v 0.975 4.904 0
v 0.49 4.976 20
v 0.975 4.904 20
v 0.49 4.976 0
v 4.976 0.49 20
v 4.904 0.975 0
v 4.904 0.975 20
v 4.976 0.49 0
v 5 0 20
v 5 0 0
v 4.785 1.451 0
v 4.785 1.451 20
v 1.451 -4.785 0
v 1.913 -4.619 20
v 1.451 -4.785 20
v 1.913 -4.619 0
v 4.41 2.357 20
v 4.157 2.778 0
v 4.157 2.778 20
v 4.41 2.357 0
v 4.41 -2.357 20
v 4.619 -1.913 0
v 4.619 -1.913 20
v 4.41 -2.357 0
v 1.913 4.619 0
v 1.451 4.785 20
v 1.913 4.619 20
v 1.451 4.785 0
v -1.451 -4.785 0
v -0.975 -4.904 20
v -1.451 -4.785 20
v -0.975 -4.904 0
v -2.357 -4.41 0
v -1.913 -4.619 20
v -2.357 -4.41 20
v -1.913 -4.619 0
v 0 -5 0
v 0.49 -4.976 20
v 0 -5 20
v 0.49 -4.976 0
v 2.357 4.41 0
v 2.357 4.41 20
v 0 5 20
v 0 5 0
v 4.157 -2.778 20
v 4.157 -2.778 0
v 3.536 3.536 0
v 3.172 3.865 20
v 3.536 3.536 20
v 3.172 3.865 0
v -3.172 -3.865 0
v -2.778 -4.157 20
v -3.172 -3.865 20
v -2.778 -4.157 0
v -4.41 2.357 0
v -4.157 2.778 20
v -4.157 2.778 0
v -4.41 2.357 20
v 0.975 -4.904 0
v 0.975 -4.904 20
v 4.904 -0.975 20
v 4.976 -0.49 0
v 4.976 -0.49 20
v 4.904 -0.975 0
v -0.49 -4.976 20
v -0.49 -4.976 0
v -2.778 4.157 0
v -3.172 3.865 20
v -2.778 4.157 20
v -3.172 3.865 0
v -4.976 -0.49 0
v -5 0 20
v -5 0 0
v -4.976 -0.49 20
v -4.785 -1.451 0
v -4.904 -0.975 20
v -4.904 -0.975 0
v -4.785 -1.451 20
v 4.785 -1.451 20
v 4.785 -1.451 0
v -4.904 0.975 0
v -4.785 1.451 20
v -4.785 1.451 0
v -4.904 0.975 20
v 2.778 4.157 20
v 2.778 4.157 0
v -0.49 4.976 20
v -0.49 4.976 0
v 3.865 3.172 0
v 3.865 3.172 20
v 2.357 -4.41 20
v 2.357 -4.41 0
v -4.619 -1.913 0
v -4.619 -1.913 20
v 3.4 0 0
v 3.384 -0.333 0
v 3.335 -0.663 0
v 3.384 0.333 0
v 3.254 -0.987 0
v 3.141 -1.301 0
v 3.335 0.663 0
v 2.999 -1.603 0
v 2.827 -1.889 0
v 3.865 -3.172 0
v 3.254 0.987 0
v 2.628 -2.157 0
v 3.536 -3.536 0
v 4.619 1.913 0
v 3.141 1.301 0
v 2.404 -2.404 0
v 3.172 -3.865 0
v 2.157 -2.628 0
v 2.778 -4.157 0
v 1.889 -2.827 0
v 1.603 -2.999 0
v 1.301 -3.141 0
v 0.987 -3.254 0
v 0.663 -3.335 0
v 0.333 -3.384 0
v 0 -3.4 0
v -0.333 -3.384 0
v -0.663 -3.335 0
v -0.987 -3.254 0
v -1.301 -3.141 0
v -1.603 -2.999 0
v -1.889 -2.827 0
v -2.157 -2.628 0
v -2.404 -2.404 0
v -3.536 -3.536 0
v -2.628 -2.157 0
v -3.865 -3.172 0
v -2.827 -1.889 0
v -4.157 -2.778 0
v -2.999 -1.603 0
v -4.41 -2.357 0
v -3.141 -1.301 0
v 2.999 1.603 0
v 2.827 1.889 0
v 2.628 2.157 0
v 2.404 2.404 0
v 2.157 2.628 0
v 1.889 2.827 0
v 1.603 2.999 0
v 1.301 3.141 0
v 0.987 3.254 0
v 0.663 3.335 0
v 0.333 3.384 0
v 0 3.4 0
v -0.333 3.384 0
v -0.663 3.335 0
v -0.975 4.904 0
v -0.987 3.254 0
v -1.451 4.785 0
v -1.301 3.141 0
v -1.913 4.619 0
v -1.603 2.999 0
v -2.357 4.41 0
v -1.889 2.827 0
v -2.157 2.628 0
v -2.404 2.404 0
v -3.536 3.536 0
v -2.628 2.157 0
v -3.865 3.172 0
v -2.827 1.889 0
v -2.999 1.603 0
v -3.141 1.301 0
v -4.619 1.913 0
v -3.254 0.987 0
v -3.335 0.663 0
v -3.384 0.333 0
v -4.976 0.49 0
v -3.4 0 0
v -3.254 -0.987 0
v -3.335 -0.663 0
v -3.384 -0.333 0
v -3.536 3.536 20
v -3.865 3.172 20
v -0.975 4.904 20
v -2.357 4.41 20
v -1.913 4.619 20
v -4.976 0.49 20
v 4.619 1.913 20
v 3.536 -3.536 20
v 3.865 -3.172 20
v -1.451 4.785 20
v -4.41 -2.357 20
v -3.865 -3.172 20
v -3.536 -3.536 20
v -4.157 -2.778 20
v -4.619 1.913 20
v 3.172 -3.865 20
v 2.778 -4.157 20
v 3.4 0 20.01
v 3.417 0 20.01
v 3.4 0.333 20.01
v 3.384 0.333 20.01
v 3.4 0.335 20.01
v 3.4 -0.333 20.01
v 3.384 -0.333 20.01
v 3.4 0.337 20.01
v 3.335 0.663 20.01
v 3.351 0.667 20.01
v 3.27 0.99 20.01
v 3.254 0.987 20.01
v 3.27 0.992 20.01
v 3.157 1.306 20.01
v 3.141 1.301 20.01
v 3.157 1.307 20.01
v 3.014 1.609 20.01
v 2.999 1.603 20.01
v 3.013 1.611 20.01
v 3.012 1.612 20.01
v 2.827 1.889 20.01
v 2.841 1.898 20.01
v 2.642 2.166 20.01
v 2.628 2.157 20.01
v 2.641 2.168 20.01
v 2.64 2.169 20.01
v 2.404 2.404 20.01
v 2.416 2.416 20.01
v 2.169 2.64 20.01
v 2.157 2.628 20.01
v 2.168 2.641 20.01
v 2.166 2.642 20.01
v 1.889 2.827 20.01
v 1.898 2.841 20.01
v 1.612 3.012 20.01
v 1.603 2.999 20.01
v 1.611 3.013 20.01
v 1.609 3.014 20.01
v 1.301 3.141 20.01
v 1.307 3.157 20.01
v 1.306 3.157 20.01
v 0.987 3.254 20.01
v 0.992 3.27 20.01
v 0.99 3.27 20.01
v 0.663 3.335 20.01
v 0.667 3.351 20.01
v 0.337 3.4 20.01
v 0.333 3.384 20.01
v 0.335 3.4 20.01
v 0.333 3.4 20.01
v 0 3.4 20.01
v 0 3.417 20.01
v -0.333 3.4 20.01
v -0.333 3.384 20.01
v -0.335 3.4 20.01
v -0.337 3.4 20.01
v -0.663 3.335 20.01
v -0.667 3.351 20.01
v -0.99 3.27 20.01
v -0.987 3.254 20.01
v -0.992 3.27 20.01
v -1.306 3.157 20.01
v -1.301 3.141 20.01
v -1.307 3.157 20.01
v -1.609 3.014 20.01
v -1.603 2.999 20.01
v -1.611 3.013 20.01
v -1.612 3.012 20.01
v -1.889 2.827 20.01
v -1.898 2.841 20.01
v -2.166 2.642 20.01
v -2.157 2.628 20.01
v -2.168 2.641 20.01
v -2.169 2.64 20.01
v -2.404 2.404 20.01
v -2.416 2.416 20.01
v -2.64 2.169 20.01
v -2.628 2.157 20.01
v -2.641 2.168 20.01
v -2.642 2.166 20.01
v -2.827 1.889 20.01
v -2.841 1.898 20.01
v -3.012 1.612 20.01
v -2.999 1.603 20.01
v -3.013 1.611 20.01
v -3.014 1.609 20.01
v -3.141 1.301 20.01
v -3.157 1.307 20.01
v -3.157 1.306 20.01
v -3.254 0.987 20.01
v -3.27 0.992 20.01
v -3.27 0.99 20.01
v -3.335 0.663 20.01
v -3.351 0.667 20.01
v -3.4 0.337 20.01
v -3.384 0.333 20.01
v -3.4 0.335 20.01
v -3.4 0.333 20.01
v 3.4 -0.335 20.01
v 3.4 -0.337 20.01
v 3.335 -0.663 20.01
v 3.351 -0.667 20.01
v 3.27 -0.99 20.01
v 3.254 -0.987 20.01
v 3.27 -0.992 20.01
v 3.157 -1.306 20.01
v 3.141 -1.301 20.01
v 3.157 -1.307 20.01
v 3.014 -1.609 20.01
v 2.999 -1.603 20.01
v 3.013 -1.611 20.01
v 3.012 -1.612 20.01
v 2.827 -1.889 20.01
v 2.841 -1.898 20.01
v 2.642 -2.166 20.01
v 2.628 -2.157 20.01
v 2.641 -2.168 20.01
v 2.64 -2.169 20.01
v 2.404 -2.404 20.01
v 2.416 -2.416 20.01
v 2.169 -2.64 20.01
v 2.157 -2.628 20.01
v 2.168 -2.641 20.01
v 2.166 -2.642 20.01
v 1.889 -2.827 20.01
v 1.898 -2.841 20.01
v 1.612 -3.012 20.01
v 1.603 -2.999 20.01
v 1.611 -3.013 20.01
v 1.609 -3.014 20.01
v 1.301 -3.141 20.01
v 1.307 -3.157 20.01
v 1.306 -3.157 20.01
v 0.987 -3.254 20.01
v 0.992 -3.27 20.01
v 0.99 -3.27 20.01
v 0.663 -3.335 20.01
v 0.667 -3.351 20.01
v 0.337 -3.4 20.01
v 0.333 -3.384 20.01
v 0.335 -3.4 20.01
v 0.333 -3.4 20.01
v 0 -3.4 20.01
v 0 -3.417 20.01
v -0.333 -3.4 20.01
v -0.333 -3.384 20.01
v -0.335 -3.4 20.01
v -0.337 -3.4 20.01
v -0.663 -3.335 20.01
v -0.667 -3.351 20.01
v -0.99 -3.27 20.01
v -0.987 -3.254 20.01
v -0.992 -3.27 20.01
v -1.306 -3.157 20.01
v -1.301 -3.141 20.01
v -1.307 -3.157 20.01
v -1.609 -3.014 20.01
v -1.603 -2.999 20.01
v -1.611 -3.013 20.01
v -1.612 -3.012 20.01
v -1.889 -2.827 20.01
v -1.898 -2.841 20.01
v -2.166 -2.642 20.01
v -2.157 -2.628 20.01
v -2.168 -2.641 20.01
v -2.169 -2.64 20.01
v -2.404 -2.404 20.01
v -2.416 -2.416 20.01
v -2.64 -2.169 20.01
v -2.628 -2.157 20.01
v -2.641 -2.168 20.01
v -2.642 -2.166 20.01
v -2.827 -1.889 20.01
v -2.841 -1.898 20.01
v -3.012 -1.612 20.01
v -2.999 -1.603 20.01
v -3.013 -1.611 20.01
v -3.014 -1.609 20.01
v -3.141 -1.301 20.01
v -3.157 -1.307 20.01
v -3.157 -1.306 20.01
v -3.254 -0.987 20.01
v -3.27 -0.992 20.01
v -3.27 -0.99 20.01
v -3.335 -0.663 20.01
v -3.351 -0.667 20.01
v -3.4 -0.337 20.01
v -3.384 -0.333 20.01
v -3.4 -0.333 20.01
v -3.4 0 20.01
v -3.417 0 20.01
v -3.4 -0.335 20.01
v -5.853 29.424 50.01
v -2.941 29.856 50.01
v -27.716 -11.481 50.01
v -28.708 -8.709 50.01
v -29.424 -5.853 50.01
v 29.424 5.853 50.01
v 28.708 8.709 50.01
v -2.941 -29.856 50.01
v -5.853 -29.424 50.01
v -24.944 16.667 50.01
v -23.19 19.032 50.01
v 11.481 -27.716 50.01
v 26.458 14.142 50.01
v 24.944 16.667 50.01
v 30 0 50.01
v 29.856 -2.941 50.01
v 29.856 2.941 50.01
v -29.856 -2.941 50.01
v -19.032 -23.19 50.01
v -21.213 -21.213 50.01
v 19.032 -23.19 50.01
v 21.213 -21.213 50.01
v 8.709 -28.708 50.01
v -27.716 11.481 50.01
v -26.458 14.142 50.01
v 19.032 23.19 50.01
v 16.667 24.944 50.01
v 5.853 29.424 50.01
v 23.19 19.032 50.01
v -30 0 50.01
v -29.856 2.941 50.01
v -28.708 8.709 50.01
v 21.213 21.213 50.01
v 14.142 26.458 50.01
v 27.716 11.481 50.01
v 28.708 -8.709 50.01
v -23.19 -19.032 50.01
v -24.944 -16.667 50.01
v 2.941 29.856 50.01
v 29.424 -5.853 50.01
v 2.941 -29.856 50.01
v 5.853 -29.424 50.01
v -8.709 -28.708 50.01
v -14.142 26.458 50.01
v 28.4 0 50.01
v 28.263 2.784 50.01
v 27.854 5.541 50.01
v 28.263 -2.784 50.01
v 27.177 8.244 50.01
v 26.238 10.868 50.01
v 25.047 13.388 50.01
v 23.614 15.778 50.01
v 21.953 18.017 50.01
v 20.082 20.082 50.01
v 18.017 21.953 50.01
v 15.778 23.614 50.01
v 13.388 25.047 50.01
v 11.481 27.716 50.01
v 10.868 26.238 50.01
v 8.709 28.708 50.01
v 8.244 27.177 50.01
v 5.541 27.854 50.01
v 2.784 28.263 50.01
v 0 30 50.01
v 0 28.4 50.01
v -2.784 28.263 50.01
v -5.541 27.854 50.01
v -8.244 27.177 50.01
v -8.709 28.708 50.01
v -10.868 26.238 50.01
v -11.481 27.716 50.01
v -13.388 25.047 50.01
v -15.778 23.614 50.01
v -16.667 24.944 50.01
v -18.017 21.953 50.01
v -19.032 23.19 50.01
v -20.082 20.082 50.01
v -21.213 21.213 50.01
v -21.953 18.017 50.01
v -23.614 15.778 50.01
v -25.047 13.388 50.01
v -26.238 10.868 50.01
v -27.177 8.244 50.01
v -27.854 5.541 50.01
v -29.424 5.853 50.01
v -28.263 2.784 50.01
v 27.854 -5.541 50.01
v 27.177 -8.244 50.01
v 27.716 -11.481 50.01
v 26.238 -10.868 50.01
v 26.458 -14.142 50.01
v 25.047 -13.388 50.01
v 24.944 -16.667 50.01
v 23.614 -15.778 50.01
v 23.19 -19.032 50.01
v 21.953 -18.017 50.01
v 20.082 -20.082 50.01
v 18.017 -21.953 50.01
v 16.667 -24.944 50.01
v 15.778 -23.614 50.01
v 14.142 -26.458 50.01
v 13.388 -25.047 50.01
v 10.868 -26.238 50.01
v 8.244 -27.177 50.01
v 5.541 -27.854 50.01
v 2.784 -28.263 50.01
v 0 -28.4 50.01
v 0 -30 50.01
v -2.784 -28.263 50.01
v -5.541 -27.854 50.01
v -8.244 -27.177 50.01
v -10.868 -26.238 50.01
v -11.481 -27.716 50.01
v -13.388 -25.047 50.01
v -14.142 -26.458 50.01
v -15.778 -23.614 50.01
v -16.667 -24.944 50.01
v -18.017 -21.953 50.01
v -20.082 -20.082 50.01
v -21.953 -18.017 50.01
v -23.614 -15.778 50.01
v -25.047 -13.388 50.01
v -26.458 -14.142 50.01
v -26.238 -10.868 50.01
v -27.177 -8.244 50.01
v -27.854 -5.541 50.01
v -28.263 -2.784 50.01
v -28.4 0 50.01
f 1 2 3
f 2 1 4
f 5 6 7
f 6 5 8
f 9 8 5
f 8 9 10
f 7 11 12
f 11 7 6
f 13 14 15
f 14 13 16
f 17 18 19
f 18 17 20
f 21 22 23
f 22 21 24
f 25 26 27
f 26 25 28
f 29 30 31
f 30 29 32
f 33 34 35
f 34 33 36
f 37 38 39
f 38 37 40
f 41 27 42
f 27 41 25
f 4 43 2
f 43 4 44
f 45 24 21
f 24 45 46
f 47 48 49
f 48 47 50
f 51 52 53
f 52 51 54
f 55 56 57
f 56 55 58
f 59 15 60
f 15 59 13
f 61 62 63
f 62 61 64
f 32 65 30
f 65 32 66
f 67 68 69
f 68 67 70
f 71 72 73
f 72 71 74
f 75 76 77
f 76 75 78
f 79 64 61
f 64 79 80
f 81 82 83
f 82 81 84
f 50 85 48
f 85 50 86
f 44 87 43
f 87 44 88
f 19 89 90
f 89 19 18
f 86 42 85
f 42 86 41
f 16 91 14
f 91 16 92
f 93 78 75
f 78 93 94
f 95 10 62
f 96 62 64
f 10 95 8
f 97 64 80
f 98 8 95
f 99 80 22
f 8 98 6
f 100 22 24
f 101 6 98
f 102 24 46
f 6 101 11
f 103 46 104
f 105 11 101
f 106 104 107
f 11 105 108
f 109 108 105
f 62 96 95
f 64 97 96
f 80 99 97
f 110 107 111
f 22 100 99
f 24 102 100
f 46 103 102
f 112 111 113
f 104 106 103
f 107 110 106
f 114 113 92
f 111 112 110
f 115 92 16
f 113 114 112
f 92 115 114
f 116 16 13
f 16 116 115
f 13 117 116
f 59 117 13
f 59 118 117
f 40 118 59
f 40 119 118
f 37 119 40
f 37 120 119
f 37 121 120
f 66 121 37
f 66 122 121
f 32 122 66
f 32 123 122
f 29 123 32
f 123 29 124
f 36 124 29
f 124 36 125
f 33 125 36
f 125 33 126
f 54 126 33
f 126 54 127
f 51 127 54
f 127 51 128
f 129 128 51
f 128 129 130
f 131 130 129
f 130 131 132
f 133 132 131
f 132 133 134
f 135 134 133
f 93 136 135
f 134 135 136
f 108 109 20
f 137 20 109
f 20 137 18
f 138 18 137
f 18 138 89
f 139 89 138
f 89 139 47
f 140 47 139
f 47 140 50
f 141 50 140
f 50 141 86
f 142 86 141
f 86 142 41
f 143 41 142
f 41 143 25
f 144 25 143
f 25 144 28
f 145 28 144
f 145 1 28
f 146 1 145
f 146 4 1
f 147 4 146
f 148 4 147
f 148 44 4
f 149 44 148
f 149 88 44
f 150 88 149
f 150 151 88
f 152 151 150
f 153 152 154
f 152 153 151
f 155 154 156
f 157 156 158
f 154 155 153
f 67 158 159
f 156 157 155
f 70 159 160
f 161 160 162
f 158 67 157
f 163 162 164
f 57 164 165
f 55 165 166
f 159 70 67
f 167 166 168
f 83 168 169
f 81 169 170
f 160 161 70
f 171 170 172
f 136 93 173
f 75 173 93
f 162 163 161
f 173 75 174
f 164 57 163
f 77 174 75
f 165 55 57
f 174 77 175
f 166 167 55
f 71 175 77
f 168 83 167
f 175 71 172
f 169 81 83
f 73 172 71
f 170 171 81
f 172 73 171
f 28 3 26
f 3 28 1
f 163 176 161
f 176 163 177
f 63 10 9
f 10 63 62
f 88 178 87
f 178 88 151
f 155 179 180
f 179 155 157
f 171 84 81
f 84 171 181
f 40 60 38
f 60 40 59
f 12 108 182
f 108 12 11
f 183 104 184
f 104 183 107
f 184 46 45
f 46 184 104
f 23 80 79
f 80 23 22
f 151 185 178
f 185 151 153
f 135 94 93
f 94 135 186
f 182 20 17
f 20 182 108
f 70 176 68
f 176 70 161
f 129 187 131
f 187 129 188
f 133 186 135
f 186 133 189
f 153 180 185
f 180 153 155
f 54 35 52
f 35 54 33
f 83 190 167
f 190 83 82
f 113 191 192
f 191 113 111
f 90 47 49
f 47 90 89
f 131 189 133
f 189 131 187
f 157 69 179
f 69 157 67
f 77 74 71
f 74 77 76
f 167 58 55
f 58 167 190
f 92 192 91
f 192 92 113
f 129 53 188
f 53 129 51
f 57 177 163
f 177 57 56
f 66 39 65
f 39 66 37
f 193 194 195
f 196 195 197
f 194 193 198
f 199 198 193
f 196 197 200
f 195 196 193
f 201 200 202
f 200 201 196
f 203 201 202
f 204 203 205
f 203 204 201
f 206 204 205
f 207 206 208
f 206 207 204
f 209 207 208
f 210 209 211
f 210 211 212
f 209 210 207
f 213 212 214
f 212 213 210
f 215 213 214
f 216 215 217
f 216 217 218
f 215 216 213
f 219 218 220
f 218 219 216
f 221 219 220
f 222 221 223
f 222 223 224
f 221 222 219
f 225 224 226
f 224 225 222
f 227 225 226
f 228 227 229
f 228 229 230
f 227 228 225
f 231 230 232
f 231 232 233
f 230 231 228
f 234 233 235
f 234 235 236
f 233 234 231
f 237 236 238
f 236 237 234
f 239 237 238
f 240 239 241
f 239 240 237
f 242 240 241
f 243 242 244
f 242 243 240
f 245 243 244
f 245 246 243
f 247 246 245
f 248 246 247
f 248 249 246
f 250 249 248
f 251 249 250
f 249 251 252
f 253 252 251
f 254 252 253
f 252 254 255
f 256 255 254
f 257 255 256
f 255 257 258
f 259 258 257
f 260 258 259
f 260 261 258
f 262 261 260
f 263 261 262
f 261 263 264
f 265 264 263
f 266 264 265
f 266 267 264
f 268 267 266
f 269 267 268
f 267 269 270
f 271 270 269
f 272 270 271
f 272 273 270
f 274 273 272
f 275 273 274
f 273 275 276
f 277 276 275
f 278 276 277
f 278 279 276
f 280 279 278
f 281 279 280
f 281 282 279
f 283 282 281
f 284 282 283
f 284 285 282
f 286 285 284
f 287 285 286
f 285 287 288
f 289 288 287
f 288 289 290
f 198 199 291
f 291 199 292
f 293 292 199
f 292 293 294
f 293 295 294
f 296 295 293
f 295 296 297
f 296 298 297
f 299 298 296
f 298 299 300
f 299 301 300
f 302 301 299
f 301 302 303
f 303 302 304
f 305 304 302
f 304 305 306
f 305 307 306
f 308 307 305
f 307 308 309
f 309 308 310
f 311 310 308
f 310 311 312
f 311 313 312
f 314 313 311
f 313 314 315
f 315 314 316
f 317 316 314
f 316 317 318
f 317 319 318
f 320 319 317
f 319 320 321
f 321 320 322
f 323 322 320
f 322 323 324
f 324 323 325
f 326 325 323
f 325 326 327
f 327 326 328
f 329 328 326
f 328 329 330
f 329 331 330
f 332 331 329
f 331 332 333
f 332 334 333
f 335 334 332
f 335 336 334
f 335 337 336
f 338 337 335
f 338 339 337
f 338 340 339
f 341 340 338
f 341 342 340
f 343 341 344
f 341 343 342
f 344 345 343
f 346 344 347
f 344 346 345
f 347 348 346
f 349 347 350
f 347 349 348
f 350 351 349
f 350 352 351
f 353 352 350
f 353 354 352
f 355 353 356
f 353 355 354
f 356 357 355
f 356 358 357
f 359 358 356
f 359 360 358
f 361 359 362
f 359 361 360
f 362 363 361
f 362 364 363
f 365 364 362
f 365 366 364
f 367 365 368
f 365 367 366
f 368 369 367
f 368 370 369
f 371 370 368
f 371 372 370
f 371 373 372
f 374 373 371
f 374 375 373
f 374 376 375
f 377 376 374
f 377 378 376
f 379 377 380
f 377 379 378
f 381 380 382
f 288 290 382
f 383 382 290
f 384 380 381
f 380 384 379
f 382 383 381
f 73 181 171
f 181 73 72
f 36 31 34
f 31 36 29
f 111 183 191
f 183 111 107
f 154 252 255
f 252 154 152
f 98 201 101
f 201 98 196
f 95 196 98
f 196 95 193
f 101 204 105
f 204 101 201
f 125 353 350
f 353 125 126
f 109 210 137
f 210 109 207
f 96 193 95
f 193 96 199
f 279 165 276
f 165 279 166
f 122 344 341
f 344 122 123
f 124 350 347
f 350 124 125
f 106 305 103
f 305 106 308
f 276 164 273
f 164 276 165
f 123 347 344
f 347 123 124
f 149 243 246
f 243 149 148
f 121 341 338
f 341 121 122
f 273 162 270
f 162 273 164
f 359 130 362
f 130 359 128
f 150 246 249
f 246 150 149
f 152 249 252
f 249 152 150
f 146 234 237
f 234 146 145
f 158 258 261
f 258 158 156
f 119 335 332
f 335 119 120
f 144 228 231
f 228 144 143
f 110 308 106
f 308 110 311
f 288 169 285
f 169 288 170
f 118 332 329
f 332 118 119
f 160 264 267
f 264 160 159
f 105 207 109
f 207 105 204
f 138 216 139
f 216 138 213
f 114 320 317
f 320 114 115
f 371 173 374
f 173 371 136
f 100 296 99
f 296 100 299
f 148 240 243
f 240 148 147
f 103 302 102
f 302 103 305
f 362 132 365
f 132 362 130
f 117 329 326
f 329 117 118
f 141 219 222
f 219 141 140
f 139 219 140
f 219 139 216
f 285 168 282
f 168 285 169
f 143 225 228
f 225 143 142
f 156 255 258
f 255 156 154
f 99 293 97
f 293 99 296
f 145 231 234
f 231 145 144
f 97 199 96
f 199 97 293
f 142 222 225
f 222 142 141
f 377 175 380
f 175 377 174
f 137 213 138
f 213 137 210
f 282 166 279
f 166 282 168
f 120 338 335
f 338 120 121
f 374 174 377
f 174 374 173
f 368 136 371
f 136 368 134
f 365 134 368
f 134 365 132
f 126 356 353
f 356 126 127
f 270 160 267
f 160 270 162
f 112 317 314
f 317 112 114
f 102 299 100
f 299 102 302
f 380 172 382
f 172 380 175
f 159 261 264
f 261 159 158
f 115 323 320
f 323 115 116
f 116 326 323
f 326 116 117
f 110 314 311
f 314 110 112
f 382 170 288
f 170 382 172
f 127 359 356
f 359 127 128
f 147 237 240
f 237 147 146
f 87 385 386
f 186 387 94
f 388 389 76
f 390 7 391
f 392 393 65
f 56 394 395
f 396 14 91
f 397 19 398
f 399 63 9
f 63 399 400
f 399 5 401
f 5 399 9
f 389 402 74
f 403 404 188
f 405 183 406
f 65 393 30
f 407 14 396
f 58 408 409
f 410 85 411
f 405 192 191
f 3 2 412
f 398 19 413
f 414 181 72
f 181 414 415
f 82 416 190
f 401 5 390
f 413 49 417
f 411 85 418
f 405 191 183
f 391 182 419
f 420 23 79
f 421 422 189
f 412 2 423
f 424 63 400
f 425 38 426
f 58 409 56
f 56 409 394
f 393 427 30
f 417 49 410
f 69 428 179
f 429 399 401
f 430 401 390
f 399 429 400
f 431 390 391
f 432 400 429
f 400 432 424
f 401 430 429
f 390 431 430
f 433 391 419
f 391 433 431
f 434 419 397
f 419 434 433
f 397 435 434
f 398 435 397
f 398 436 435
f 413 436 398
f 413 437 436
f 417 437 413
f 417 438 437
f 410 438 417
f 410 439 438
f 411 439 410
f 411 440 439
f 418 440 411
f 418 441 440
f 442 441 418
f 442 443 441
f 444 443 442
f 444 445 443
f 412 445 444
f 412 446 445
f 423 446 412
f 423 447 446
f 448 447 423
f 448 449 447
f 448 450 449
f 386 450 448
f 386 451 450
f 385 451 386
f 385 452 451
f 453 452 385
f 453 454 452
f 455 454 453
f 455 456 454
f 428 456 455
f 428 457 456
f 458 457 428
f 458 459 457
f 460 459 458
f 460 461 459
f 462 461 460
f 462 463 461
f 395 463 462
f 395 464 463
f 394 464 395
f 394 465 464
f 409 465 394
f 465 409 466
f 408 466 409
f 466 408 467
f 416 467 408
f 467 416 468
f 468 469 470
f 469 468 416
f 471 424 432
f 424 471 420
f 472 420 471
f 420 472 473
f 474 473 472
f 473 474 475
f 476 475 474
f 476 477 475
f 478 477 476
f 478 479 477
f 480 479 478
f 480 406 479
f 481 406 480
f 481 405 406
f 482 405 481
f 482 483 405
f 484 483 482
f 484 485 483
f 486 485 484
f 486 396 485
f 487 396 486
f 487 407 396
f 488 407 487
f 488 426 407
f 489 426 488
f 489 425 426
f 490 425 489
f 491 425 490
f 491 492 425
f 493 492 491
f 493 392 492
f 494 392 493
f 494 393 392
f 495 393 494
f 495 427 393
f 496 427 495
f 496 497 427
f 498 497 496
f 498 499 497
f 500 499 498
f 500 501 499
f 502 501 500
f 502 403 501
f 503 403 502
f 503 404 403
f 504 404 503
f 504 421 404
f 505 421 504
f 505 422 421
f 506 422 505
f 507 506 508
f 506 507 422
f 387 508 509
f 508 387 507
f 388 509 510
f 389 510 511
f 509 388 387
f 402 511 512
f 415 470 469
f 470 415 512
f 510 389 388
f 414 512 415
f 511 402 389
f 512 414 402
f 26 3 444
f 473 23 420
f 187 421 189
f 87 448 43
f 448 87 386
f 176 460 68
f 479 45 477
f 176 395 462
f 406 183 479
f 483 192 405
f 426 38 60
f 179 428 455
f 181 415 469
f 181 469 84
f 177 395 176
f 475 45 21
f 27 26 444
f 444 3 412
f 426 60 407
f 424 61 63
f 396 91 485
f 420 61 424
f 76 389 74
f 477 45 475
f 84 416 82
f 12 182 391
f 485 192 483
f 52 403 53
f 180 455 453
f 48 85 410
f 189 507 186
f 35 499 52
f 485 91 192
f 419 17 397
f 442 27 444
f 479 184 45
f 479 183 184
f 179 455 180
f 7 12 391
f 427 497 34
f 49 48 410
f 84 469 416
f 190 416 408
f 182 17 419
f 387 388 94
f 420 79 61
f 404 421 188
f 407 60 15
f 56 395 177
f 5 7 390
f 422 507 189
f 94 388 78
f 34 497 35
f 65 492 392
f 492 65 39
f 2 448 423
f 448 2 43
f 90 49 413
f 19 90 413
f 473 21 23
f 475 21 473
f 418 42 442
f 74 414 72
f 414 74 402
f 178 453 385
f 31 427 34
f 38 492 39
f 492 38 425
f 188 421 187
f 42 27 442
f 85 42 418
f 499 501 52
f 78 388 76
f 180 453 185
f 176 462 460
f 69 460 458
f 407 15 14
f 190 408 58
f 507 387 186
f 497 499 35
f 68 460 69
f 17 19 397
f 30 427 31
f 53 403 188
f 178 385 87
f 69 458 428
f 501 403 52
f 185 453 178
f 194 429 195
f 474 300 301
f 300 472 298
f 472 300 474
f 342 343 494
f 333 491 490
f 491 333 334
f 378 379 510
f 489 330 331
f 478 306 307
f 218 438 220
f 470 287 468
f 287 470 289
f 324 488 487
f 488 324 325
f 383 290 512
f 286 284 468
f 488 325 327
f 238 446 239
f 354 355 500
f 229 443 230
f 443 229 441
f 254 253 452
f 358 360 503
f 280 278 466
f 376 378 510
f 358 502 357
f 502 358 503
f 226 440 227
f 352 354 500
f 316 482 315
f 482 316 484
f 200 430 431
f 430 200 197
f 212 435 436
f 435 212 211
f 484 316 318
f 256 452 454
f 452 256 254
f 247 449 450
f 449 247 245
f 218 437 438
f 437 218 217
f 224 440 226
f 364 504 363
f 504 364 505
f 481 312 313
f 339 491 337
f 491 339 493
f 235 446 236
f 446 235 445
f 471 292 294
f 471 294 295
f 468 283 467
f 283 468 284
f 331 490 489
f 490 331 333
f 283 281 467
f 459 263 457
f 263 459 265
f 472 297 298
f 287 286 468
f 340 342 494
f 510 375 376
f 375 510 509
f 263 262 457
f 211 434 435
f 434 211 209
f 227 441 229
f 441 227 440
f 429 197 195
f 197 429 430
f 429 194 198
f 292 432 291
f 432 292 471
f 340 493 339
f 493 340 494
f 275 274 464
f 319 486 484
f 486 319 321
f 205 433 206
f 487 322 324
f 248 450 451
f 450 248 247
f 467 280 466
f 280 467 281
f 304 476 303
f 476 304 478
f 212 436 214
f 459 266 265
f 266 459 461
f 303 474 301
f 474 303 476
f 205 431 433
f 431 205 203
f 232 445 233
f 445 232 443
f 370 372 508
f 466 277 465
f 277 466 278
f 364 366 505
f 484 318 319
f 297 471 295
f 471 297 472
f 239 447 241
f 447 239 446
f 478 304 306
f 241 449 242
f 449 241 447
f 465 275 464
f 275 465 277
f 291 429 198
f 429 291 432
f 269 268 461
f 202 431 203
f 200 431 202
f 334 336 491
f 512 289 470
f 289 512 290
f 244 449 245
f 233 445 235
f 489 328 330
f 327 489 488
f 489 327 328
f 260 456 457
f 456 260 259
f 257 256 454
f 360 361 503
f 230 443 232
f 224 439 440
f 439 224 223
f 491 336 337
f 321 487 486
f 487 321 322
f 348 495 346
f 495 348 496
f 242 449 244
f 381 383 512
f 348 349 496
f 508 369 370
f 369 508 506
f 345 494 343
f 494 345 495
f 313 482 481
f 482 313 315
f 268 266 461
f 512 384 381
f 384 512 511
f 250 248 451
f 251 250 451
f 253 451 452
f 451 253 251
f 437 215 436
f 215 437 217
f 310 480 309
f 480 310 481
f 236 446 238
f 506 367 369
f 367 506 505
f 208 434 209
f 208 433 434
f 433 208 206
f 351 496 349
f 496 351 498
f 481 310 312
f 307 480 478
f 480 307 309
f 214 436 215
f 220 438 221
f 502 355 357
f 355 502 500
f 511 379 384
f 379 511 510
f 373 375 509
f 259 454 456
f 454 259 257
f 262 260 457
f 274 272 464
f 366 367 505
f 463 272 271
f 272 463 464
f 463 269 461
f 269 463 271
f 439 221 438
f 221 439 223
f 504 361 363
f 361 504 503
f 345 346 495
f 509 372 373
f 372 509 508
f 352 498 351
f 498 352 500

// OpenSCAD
// Lab Funnel Design
// Wall thickness: 1.6 mm
// Spout: 10 mm outer diameter, 20 mm tall (z = 0 to z = 20)
// Cone: 10 mm outer diameter at z = 20, 60 mm outer diameter at z = 50

$fn = 64;

wall_thickness = 1.6;
spout_height = 20;
spout_outer_diameter = 10;
spout_inner_diameter = spout_outer_diameter - 2 * wall_thickness;
cone_height = 30; // from z=20 to z=50
cone_top_outer_diameter = spout_outer_diameter;
cone_bottom_outer_diameter = 60;
cone_top_inner_diameter = spout_inner_diameter;
cone_bottom_inner_diameter = cone_bottom_outer_diameter - 2 * wall_thickness;

// Spout (cylinder with hole)
module spout() {
    difference() {
        cylinder(h = spout_height + 0.01, d = spout_outer_diameter, center = false);
        translate([0, 0, -0.01]) 
            cylinder(h = spout_height + 0.02, d = spout_inner_diameter, center = false);
    }
}

// Cone (frustum with hole)
module cone() {
    translate([0, 0, spout_height]) {
        difference() {
            // Outer cone
            cylinder(h = cone_height + 0.01, 
                     r1 = cone_top_outer_diameter / 2, 
                     r2 = cone_bottom_outer_diameter / 2, 
                     center = false);
            // Inner cone (with correct wall thickness)
            translate([0, 0, -0.01]) 
                cylinder(h = cone_height + 0.02, 
                         r1 = cone_top_inner_diameter / 2, 
                         r2 = cone_bottom_inner_diameter / 2, 
                         center = false);
        }
    }
}

// Build the funnel
spout();
cone();
